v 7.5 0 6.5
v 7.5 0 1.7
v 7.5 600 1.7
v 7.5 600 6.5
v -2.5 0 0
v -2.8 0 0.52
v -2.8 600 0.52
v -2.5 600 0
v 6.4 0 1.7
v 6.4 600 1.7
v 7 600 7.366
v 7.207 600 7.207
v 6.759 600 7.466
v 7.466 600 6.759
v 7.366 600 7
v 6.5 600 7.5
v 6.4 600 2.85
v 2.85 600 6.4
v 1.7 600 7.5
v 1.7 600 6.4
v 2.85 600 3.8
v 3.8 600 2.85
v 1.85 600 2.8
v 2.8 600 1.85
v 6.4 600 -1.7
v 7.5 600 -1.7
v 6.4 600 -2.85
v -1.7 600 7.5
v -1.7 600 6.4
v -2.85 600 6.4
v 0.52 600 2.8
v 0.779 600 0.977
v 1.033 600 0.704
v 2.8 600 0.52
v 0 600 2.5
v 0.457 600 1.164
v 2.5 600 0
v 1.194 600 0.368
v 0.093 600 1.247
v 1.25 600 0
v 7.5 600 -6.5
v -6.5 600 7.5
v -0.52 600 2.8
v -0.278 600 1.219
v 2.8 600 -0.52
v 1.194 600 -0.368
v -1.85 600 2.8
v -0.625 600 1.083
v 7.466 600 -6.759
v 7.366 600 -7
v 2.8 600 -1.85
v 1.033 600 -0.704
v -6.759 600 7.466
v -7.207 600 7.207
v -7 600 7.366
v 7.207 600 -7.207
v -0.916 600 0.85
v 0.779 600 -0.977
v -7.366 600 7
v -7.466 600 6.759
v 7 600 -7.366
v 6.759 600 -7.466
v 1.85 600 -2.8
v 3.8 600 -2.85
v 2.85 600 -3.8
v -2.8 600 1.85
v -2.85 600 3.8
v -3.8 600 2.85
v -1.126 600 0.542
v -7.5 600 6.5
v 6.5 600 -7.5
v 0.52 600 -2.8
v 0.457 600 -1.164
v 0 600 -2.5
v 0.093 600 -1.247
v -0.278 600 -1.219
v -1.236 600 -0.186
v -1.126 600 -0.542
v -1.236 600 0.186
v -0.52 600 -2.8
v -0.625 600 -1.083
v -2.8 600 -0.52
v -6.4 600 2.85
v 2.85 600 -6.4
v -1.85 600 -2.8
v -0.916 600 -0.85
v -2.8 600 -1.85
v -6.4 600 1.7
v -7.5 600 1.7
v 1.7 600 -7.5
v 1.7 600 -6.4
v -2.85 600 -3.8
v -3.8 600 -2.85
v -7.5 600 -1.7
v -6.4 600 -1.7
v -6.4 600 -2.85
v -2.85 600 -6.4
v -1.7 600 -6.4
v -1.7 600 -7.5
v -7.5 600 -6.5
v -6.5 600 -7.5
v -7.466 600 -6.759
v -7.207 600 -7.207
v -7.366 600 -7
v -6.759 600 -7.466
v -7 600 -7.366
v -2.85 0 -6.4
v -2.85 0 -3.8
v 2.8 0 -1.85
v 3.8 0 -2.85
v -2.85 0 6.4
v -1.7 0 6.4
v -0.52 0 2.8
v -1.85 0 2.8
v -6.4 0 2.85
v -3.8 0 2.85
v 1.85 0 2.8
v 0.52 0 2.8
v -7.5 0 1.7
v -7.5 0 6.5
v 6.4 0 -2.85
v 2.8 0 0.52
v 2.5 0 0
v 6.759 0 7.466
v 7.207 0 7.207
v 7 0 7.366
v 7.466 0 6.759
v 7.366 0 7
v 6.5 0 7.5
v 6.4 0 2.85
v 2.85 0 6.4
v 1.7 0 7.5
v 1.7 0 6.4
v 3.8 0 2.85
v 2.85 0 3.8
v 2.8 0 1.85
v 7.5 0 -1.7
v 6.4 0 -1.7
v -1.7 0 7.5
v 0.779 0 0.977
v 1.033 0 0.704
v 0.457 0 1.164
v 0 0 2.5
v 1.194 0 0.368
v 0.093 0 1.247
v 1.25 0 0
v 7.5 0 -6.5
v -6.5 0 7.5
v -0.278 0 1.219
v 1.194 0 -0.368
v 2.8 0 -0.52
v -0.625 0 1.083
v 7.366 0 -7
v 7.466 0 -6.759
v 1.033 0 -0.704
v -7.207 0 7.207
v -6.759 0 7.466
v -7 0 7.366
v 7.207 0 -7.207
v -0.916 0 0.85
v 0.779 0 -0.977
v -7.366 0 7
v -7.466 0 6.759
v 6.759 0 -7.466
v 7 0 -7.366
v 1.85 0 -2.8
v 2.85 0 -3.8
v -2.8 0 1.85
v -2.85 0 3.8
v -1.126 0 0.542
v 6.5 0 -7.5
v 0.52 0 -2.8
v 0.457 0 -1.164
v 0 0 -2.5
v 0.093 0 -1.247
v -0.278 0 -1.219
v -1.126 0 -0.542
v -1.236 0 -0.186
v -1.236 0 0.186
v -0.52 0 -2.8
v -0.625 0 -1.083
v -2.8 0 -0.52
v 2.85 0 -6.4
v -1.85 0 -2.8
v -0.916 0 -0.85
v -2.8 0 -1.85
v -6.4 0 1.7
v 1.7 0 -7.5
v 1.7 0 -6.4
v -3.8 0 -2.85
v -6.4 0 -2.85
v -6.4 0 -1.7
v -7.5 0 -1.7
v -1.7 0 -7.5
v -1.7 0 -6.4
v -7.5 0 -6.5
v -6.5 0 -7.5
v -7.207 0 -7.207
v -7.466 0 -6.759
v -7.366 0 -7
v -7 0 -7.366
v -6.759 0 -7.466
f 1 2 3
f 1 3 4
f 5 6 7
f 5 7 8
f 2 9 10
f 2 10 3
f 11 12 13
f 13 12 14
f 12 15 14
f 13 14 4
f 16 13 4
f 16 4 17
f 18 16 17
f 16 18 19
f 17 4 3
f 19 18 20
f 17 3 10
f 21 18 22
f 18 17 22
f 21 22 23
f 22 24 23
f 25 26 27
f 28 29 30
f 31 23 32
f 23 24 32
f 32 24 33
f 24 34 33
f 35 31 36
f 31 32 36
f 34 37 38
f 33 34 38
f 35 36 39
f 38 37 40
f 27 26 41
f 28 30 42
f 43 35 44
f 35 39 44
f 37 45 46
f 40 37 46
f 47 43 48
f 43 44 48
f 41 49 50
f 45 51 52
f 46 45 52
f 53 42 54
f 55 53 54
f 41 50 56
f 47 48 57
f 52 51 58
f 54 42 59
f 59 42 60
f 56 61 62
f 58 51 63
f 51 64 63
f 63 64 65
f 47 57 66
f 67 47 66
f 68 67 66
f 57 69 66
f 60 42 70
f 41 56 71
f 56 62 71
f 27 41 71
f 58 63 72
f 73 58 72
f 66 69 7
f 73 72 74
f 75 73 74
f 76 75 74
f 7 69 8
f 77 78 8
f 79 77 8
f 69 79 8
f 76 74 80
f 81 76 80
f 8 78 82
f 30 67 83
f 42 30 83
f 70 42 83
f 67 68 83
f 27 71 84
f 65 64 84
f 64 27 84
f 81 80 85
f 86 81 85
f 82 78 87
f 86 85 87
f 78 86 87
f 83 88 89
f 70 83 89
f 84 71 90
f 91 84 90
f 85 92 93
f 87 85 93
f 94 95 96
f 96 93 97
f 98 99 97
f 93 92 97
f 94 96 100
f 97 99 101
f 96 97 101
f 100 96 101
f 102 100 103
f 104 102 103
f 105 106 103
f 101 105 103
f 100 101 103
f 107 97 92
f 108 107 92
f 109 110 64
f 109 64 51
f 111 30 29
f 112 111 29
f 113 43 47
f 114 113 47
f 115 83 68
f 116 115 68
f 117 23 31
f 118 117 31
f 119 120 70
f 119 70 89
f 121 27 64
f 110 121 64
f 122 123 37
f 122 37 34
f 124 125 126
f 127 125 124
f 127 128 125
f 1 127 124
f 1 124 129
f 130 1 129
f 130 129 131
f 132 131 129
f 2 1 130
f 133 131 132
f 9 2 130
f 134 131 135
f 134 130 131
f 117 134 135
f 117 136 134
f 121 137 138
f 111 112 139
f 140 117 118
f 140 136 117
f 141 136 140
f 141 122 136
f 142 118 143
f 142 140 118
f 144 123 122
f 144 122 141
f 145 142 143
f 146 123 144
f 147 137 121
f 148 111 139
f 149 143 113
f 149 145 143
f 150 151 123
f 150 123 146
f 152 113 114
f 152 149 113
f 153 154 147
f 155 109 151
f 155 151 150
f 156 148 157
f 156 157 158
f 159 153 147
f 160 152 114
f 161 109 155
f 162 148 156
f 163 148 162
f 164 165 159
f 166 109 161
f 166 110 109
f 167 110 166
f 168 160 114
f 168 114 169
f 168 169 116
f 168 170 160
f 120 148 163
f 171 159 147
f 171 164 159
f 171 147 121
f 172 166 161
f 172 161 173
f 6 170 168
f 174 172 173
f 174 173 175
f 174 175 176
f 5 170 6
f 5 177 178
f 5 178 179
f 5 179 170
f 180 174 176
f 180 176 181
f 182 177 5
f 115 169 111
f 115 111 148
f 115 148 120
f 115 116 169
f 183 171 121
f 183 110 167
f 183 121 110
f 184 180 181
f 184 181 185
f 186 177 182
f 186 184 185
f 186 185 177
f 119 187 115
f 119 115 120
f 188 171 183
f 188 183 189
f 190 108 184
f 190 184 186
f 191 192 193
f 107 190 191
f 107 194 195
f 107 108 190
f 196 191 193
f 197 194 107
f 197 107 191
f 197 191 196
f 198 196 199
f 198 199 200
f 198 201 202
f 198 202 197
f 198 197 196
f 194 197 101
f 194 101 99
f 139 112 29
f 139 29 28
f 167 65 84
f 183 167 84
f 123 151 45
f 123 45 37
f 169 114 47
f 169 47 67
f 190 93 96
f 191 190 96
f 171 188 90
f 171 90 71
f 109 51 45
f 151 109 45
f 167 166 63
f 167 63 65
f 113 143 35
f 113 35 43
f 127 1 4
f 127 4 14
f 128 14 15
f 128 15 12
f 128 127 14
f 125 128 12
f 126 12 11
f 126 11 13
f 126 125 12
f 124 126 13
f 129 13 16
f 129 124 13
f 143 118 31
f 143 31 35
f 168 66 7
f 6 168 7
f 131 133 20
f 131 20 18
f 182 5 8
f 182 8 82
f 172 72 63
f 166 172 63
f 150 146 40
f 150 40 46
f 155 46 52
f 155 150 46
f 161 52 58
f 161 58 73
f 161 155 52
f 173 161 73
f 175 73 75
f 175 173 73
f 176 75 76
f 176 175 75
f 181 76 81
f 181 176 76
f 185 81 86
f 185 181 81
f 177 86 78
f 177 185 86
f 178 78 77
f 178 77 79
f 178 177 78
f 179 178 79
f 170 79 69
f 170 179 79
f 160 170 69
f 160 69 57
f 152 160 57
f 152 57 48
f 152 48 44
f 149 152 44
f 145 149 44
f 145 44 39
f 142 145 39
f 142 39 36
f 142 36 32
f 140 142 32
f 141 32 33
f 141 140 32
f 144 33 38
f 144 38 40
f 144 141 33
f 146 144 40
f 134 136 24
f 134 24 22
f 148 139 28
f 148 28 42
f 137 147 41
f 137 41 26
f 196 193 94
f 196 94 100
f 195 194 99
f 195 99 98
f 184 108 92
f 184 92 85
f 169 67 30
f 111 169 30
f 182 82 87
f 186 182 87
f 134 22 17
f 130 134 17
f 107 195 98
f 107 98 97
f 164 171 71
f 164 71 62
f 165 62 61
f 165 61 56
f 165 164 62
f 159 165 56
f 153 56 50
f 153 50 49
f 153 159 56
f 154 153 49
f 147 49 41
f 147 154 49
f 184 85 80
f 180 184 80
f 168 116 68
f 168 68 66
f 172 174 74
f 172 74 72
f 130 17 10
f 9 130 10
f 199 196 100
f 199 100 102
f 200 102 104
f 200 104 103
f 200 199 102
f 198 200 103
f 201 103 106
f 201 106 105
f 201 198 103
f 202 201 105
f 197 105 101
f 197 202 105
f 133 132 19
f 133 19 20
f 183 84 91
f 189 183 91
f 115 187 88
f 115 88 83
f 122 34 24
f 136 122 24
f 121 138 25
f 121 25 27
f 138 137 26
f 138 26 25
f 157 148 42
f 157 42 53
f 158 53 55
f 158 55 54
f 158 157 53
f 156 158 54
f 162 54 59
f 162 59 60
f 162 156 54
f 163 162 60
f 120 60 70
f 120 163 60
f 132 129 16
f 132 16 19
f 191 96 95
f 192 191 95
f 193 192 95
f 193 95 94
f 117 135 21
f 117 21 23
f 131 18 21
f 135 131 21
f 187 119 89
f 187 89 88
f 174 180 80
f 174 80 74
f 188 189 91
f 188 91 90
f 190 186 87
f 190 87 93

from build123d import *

# Parameters (mm, degrees)
SKETCH1_R           = 1.25
BOSS_EXTRUDE1_DEPTH = 600


with BuildPart() as part:
    # Sketch1 → Boss-Extrude1 (new body)
    with BuildSketch(Plane(origin=(0, 0, 0), x_dir=(1, 0, 0), z_dir=(0, 1, 0))):
        with BuildLine():
            Line((6.5, -7.5), (1.7, -7.5))
            Line((1.7, -7.5), (1.7, -6.4))
            Line((1.7, -6.4), (2.85, -6.4))
            Line((2.85, -6.4), (2.85, -3.8))
            Line((2.85, -3.8), (1.85, -2.8))
            Line((1.85, -2.8), (0.519615242, -2.8))
            Line((0.519615242, -2.8), (0, -2.5))
            Line((0, -2.5), (-0.519615242, -2.8))
            Line((-0.519615242, -2.8), (-1.85, -2.8))
            Line((-1.85, -2.8), (-2.85, -3.8))
            Line((-2.85, -3.8), (-2.85, -6.4))
            Line((-2.85, -6.4), (-1.7, -6.4))
            Line((-1.7, -6.4), (-1.7, -7.5))
            Line((-1.7, -7.5), (-6.5, -7.5))
            ThreePointArc((-6.5, -7.5), (-7.207106781, -7.207106781), (-7.5, -6.5))
            Line((-7.5, -6.5), (-7.5, -1.7))
            Line((-7.5, -1.7), (-6.4, -1.7))
            Line((-6.4, -1.7), (-6.4, -2.85))
            Line((-6.4, -2.85), (-3.8, -2.85))
            Line((-3.8, -2.85), (-2.8, -1.85))
            Line((-2.8, -1.85), (-2.8, -0.519615242))
            Line((-2.8, -0.519615242), (-2.5, 0))
            Line((-2.5, 0), (-2.8, 0.519615242))
            Line((-2.8, 0.519615242), (-2.8, 1.85))
            Line((-2.8, 1.85), (-3.8, 2.85))
            Line((-3.8, 2.85), (-6.4, 2.85))
            Line((-6.4, 2.85), (-6.4, 1.7))
            Line((-6.4, 1.7), (-7.5, 1.7))
            Line((-7.5, 1.7), (-7.5, 6.5))
            ThreePointArc((-7.5, 6.5), (-7.207106781, 7.207106781), (-6.5, 7.5))
            Line((-6.5, 7.5), (-1.7, 7.5))
            Line((-1.7, 7.5), (-1.7, 6.4))
            Line((-1.7, 6.4), (-2.85, 6.4))
            Line((-2.85, 6.4), (-2.85, 3.8))
            Line((-2.85, 3.8), (-1.85, 2.8))
            Line((-1.85, 2.8), (-0.519615242, 2.8))
            Line((-0.519615242, 2.8), (0, 2.5))
            Line((0, 2.5), (0.519615242, 2.8))
            Line((0.519615242, 2.8), (1.85, 2.8))
            Line((1.85, 2.8), (2.85, 3.8))
            Line((2.85, 3.8), (2.85, 6.4))
            Line((2.85, 6.4), (1.7, 6.4))
            Line((1.7, 6.4), (1.7, 7.5))
            Line((1.7, 7.5), (6.5, 7.5))
            ThreePointArc((6.5, 7.5), (7.207106781, 7.207106781), (7.5, 6.5))
            Line((7.5, 6.5), (7.5, 1.7))
            Line((7.5, 1.7), (6.4, 1.7))
            Line((6.4, 1.7), (6.4, 2.85))
            Line((6.4, 2.85), (3.8, 2.85))
            Line((3.8, 2.85), (2.8, 1.85))
            Line((2.8, 1.85), (2.8, 0.519615242))
            Line((2.8, 0.519615242), (2.5, 0))
            Line((2.5, 0), (2.8, -0.519615242))
            Line((2.8, -0.519615242), (2.8, -1.85))
            Line((2.8, -1.85), (3.8, -2.85))
            Line((3.8, -2.85), (6.4, -2.85))
            Line((6.4, -2.85), (6.4, -1.7))
            Line((6.4, -1.7), (7.5, -1.7))
            Line((7.5, -1.7), (7.5, -6.5))
            ThreePointArc((7.5, -6.5), (7.207106781, -7.207106781), (6.5, -7.5))
        make_face()
        Circle(SKETCH1_R, mode=Mode.SUBTRACT)
    extrude(amount=BOSS_EXTRUDE1_DEPTH)


solid = part.part
